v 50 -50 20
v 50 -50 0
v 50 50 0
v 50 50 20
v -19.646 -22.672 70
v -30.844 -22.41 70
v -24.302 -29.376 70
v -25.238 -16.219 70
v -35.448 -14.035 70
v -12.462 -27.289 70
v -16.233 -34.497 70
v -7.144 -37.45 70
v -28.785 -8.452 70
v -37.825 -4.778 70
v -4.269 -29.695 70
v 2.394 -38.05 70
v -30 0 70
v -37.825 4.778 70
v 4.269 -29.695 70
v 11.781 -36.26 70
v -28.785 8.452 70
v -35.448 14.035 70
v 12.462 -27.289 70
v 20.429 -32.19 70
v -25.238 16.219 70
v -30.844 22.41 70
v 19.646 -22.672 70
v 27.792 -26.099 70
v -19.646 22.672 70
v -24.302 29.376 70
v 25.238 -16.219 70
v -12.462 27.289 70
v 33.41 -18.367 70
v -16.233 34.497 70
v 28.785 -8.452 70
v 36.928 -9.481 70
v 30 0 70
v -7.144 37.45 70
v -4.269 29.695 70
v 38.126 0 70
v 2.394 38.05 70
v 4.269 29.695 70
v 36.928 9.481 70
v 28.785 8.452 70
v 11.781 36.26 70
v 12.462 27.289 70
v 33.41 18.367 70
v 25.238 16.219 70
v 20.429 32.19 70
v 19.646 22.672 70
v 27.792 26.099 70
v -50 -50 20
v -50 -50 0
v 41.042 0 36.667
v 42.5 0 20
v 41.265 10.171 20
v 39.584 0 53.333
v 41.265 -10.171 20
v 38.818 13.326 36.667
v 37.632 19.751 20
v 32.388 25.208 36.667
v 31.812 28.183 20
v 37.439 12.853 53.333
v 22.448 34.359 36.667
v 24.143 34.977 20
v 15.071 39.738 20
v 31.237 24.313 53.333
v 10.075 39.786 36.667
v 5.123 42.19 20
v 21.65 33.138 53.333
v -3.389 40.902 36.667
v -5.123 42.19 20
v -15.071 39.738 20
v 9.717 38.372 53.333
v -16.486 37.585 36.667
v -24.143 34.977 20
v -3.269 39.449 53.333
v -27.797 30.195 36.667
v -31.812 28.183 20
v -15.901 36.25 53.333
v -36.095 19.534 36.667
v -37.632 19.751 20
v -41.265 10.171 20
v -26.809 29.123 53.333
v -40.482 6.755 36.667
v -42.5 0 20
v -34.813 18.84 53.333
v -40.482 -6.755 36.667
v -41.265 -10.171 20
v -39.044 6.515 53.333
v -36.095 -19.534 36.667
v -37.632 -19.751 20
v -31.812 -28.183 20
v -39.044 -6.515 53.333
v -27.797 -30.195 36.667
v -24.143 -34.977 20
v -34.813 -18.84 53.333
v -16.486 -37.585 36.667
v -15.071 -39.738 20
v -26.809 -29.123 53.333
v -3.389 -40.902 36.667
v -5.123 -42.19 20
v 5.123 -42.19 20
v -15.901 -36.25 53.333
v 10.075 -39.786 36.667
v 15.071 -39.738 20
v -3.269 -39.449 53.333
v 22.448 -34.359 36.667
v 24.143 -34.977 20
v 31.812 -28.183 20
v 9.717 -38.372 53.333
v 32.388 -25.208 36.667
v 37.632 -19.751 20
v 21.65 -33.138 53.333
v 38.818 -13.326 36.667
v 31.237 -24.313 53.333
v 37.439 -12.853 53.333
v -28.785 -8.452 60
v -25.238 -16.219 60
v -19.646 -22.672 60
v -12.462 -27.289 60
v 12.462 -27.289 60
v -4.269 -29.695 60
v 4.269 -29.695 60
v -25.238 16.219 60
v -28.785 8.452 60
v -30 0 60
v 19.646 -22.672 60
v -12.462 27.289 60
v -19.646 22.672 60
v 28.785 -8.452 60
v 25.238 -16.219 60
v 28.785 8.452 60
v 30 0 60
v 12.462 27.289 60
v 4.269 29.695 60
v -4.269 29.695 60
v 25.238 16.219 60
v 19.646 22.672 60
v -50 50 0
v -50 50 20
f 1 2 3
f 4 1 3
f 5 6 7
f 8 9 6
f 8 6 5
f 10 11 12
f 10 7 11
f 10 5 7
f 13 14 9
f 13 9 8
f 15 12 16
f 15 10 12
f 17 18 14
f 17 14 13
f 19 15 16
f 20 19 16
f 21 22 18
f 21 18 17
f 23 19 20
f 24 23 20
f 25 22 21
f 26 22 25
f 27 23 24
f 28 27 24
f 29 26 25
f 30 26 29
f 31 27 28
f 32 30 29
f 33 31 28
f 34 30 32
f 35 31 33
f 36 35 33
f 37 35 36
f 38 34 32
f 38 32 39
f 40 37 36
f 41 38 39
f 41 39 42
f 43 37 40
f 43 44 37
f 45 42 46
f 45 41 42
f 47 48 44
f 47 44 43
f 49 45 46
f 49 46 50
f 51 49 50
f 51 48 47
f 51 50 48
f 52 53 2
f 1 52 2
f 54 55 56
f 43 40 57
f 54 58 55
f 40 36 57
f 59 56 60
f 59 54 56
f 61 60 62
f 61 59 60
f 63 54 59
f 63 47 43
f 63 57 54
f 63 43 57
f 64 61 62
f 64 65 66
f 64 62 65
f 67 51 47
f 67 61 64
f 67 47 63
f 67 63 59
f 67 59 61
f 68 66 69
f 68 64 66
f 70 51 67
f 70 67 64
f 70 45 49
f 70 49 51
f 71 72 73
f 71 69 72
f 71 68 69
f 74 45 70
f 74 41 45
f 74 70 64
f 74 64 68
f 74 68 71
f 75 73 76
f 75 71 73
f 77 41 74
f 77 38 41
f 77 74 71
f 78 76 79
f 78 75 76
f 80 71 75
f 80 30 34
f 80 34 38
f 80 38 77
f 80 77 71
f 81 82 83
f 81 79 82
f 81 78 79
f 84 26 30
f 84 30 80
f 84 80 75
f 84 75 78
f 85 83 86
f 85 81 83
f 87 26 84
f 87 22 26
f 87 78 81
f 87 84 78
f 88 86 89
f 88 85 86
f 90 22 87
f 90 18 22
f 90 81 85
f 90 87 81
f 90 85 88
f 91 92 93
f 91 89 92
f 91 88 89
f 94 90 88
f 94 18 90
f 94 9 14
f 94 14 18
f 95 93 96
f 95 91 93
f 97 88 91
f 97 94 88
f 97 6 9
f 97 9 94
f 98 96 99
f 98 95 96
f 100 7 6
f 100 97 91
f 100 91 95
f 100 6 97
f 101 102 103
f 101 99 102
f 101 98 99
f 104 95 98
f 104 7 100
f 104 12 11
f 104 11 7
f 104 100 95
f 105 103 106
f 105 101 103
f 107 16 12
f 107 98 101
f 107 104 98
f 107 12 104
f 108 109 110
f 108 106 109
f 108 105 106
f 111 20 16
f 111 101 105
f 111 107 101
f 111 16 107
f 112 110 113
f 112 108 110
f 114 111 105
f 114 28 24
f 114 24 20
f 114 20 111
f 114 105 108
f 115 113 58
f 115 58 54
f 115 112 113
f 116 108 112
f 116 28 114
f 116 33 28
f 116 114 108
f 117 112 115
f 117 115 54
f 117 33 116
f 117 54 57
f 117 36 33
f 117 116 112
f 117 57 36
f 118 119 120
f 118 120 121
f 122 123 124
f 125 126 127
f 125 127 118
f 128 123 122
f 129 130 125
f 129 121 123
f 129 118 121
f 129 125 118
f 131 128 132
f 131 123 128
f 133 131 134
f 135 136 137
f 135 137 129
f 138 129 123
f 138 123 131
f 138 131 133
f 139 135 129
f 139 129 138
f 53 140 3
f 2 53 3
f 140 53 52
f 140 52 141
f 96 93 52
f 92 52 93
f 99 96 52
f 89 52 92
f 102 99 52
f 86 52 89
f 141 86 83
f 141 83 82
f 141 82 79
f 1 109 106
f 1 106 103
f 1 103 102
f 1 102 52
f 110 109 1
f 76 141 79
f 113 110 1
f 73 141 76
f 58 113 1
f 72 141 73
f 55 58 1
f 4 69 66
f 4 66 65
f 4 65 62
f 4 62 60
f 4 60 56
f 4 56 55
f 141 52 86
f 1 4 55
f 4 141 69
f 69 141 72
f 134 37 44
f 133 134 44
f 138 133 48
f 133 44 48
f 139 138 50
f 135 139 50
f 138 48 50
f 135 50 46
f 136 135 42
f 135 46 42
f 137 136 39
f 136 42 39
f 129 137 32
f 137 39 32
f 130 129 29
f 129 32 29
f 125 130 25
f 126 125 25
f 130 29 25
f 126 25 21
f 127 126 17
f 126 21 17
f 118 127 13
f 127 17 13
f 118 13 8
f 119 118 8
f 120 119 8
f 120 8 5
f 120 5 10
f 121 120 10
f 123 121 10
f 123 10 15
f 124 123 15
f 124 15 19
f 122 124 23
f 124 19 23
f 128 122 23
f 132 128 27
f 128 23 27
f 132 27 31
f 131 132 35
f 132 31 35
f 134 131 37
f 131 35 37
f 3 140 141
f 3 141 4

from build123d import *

# Parameters (mm, degrees)
F0_W     = 100
F0_H     = 100
F1_DEPTH = 20
F2_R     = 42.5
F3_DEPTH = 50
F3_TAPER = 5
F4_R     = 30
F5_DEPTH = 10


with BuildPart() as f1:
    # F0 (on Top) → F1 (new body)
    with BuildSketch(Plane.XY):
        Rectangle(F0_W, F0_H)
    extrude(amount=F1_DEPTH)

    # F2 (on face) → F3 (join)
    with BuildSketch(Plane.XY.offset(20)):
        Circle(F2_R)
    extrude(amount=F3_DEPTH, taper=F3_TAPER)

    # F4 (on face) → F5 (cut)
    with BuildSketch(Plane.XY.offset(70)):
        Circle(F4_R)
    extrude(amount=-F5_DEPTH, mode=Mode.SUBTRACT)


solid = f1.part
